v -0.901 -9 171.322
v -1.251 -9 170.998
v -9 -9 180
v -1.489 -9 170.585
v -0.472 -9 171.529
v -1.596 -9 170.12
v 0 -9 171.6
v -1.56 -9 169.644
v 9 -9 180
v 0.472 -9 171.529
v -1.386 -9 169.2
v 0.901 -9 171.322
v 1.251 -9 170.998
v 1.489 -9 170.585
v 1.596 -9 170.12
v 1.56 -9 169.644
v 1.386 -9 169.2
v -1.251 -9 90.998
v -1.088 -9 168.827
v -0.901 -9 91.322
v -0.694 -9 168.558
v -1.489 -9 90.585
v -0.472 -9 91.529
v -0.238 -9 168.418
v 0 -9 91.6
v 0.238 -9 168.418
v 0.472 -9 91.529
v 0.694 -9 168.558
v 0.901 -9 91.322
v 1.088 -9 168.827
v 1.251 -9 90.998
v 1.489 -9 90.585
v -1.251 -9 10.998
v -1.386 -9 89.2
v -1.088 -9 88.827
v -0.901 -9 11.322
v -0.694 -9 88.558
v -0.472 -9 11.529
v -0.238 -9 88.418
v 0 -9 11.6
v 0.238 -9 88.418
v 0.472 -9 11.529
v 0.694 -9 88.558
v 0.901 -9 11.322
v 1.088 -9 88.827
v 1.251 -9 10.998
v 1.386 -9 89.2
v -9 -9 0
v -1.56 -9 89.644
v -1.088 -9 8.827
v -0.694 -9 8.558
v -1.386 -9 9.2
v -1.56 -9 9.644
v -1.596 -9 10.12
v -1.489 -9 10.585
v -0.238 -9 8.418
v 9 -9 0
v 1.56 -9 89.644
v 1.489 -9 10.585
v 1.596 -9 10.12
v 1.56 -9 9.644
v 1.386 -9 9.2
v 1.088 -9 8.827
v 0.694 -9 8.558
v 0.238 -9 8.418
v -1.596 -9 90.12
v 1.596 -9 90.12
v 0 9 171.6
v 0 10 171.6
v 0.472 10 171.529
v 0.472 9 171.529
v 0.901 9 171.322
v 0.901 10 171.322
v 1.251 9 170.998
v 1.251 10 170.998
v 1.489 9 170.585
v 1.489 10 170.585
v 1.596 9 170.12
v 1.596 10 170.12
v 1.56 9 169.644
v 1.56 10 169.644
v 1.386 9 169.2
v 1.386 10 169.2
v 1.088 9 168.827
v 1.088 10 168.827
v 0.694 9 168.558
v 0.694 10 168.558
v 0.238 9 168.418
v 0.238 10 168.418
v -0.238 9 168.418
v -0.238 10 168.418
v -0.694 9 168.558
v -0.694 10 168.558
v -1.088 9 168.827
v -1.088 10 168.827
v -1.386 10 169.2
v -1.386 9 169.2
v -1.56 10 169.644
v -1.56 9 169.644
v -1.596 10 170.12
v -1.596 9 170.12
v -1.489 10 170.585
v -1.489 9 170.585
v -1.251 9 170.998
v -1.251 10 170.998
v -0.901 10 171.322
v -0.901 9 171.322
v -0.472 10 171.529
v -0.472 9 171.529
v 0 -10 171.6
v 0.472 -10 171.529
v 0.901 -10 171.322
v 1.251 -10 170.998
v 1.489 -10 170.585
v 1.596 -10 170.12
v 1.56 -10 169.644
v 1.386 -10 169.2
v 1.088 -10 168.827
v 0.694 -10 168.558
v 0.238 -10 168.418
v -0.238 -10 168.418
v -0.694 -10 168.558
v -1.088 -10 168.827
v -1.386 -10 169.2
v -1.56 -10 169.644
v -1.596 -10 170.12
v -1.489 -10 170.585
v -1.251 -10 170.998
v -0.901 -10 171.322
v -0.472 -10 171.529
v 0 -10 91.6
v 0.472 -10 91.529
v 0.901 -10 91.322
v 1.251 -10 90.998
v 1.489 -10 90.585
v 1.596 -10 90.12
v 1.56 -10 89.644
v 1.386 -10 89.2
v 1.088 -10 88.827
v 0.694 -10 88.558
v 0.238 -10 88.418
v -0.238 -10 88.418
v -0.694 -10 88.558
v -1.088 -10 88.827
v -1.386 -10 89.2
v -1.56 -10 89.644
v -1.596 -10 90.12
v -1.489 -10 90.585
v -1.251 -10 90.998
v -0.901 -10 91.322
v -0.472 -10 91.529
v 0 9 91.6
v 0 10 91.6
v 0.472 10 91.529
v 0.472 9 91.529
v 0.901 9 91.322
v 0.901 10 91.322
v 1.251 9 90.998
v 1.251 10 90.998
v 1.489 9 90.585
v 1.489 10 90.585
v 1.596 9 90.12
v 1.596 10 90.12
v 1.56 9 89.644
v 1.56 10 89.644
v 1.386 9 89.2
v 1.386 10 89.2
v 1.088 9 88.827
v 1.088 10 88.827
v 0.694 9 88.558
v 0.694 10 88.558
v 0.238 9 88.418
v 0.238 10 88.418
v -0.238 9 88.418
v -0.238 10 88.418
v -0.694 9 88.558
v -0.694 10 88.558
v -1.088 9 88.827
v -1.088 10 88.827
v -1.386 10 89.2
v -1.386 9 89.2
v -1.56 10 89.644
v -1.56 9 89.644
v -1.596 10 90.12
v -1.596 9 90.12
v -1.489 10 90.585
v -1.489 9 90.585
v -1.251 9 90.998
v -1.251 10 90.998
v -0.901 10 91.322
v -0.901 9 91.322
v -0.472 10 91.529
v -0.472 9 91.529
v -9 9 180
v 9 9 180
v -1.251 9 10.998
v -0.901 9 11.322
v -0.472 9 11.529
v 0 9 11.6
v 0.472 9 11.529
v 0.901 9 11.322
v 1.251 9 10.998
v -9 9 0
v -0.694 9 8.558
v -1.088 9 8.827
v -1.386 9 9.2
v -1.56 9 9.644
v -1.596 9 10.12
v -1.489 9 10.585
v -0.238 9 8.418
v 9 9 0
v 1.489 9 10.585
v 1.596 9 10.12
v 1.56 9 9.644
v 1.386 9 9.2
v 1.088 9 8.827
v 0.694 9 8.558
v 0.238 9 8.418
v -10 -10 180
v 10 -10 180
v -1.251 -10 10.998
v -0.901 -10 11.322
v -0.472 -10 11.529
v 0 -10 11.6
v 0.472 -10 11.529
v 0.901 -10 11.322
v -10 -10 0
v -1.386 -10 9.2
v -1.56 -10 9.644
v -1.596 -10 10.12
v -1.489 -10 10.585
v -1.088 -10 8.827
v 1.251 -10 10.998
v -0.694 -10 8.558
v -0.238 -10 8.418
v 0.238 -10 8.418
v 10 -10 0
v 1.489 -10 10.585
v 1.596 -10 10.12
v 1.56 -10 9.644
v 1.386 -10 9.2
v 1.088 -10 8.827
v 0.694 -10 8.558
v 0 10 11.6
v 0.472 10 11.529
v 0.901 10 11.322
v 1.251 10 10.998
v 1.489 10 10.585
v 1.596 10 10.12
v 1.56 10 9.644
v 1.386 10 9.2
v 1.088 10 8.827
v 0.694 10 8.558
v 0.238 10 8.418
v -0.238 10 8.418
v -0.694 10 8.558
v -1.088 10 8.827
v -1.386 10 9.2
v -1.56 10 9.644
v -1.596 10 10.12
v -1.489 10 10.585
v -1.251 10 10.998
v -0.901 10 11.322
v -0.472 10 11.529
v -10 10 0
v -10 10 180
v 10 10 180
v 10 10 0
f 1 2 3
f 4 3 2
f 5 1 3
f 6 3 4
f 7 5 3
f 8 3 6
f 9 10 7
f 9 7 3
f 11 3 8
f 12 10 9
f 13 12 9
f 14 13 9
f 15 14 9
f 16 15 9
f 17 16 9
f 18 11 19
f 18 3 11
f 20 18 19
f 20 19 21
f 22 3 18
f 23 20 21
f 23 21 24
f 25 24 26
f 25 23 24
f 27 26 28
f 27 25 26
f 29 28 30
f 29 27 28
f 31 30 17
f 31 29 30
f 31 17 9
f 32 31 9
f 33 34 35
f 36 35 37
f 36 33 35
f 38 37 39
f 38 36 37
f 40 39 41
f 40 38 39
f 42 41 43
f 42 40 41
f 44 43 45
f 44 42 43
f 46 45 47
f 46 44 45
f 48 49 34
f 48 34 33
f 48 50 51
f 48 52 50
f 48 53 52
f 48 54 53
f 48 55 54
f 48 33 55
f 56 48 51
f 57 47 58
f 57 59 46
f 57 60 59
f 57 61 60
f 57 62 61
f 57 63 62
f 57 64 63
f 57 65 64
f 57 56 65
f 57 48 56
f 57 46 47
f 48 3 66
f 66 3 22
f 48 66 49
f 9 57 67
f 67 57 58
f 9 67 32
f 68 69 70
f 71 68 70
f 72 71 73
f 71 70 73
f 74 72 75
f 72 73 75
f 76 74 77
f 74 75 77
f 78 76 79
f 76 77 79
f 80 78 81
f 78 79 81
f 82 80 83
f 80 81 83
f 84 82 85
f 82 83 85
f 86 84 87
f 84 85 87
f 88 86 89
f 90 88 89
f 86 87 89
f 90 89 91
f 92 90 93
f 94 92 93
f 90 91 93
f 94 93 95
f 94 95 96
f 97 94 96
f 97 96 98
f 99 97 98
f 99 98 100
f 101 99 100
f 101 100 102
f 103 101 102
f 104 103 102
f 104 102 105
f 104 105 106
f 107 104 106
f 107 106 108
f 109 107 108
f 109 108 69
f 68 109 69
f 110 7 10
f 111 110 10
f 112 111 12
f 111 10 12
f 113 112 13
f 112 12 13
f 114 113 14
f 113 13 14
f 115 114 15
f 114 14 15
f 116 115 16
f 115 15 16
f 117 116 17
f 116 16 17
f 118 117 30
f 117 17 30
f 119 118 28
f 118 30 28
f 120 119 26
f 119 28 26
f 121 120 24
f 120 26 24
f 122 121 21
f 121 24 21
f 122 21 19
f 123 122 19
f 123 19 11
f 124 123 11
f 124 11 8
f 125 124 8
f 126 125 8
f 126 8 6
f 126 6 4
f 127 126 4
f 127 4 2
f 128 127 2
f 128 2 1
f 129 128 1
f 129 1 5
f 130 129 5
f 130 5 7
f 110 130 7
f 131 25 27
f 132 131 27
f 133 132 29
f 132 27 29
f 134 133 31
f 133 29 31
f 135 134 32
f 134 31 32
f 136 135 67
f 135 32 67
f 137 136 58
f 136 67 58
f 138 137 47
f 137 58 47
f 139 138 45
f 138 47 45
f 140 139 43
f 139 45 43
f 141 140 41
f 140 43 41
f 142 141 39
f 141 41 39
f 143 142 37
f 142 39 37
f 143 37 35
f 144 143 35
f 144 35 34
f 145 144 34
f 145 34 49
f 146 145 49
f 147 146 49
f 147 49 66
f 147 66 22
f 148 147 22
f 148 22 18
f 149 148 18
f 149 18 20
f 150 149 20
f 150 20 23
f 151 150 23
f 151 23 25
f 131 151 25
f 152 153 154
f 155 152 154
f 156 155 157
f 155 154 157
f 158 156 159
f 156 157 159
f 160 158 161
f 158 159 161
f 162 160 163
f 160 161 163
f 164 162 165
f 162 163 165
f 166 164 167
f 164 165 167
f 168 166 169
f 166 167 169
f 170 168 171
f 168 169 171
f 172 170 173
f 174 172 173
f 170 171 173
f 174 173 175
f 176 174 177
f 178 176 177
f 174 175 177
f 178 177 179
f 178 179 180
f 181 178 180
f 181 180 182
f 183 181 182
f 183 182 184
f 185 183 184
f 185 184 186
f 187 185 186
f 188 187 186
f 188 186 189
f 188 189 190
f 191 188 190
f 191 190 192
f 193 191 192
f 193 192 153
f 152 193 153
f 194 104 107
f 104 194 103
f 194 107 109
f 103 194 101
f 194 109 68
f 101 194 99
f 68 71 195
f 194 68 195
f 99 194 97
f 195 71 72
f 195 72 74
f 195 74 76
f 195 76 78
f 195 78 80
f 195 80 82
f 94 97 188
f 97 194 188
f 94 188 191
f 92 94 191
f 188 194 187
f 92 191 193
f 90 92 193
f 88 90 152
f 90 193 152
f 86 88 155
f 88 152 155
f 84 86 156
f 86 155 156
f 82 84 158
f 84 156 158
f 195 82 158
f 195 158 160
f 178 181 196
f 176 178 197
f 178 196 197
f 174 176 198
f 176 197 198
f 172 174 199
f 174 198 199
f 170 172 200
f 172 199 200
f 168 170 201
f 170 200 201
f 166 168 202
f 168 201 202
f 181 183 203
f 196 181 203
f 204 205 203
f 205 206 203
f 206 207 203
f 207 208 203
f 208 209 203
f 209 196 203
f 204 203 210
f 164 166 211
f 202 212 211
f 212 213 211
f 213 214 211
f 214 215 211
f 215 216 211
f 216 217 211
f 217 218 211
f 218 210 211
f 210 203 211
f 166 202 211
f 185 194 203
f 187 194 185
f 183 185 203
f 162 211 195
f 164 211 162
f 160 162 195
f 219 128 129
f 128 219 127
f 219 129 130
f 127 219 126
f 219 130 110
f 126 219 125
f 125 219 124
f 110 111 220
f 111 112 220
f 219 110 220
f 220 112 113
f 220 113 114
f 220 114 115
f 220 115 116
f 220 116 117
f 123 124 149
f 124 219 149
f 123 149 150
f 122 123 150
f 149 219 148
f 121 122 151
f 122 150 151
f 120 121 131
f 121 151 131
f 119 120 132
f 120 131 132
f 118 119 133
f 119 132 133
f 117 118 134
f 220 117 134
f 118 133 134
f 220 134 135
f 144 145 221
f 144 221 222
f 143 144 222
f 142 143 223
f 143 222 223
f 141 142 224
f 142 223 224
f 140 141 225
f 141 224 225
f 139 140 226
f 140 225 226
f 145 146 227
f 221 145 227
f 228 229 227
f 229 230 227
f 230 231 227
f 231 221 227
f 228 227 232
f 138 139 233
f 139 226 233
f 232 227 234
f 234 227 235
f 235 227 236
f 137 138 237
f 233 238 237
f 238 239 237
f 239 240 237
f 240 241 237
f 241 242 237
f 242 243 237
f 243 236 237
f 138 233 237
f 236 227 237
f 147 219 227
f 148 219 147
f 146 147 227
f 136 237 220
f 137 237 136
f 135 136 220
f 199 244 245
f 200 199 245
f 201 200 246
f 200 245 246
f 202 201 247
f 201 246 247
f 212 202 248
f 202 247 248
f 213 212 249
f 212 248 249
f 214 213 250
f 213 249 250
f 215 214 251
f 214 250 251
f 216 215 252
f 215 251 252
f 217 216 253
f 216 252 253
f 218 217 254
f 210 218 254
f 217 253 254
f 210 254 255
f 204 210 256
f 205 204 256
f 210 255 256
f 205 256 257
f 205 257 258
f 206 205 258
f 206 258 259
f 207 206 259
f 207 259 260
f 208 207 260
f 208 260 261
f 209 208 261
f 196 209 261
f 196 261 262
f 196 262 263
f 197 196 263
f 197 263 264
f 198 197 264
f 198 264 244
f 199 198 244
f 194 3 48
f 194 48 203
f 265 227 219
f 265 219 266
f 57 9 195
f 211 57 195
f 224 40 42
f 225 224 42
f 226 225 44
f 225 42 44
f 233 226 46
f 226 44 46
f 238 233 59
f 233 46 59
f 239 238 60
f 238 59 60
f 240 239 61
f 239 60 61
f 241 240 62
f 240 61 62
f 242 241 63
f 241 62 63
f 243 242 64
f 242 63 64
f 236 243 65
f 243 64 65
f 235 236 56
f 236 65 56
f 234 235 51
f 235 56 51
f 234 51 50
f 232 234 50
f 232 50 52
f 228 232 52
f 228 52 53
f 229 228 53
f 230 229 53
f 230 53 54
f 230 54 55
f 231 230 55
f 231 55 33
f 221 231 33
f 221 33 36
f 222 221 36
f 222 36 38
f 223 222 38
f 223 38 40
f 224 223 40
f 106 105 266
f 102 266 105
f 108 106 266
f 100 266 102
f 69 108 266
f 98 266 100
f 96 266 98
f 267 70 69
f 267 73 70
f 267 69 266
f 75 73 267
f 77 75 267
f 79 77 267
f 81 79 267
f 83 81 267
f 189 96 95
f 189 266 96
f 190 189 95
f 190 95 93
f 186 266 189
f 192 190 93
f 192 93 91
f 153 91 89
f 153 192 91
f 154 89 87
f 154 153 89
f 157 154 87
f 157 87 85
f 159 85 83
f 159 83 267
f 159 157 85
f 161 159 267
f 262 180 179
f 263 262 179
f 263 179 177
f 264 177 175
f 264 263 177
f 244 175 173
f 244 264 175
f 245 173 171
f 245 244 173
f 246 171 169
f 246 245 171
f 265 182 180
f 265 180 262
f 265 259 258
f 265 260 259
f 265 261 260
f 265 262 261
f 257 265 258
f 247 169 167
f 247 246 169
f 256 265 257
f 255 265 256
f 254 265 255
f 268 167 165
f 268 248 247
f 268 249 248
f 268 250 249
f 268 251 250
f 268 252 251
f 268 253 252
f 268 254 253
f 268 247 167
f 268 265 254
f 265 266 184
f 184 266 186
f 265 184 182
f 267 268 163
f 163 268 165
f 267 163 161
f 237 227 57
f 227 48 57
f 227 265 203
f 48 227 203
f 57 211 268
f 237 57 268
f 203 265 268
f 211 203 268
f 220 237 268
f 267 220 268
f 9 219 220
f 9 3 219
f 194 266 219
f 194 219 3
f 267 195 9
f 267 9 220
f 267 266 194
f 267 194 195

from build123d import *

# Parameters (mm, degrees)
SKETCH_1_W          = 20
SKETCH_1_H          = 20
SKETCH_1_W_2        = 18
SKETCH_1_H_2        = 18
EXTRUDE_1_DEPTH     = 180
SKETCH_2_R          = 1.6
CUT_EXTRUDE_1_DEPTH = 50


with BuildPart() as part:
    # 草图1 → 凸台-拉伸1 (new body)
    with BuildSketch(Plane.XY):
        Rectangle(SKETCH_1_W, SKETCH_1_H)
        Rectangle(SKETCH_1_W_2, SKETCH_1_H_2, mode=Mode.SUBTRACT)
    extrude(amount=EXTRUDE_1_DEPTH)

    # 草图2 → 切除-拉伸1 (cut)
    with BuildSketch(Plane(origin=(0, 10, 0), x_dir=(1, 0, 0), z_dir=(0, 1, 0))):
        with Locations(Location((0, -90, 0), (0, 0, 270))):
            Circle(SKETCH_2_R)
        with Locations(Location((0, -170, 0), (0, 0, 270))):
            Circle(SKETCH_2_R)
        with Locations(Location((0, -10, 0), (0, 0, 270))):
            Circle(SKETCH_2_R)
    extrude(amount=-CUT_EXTRUDE_1_DEPTH, mode=Mode.SUBTRACT)


solid = part.part
